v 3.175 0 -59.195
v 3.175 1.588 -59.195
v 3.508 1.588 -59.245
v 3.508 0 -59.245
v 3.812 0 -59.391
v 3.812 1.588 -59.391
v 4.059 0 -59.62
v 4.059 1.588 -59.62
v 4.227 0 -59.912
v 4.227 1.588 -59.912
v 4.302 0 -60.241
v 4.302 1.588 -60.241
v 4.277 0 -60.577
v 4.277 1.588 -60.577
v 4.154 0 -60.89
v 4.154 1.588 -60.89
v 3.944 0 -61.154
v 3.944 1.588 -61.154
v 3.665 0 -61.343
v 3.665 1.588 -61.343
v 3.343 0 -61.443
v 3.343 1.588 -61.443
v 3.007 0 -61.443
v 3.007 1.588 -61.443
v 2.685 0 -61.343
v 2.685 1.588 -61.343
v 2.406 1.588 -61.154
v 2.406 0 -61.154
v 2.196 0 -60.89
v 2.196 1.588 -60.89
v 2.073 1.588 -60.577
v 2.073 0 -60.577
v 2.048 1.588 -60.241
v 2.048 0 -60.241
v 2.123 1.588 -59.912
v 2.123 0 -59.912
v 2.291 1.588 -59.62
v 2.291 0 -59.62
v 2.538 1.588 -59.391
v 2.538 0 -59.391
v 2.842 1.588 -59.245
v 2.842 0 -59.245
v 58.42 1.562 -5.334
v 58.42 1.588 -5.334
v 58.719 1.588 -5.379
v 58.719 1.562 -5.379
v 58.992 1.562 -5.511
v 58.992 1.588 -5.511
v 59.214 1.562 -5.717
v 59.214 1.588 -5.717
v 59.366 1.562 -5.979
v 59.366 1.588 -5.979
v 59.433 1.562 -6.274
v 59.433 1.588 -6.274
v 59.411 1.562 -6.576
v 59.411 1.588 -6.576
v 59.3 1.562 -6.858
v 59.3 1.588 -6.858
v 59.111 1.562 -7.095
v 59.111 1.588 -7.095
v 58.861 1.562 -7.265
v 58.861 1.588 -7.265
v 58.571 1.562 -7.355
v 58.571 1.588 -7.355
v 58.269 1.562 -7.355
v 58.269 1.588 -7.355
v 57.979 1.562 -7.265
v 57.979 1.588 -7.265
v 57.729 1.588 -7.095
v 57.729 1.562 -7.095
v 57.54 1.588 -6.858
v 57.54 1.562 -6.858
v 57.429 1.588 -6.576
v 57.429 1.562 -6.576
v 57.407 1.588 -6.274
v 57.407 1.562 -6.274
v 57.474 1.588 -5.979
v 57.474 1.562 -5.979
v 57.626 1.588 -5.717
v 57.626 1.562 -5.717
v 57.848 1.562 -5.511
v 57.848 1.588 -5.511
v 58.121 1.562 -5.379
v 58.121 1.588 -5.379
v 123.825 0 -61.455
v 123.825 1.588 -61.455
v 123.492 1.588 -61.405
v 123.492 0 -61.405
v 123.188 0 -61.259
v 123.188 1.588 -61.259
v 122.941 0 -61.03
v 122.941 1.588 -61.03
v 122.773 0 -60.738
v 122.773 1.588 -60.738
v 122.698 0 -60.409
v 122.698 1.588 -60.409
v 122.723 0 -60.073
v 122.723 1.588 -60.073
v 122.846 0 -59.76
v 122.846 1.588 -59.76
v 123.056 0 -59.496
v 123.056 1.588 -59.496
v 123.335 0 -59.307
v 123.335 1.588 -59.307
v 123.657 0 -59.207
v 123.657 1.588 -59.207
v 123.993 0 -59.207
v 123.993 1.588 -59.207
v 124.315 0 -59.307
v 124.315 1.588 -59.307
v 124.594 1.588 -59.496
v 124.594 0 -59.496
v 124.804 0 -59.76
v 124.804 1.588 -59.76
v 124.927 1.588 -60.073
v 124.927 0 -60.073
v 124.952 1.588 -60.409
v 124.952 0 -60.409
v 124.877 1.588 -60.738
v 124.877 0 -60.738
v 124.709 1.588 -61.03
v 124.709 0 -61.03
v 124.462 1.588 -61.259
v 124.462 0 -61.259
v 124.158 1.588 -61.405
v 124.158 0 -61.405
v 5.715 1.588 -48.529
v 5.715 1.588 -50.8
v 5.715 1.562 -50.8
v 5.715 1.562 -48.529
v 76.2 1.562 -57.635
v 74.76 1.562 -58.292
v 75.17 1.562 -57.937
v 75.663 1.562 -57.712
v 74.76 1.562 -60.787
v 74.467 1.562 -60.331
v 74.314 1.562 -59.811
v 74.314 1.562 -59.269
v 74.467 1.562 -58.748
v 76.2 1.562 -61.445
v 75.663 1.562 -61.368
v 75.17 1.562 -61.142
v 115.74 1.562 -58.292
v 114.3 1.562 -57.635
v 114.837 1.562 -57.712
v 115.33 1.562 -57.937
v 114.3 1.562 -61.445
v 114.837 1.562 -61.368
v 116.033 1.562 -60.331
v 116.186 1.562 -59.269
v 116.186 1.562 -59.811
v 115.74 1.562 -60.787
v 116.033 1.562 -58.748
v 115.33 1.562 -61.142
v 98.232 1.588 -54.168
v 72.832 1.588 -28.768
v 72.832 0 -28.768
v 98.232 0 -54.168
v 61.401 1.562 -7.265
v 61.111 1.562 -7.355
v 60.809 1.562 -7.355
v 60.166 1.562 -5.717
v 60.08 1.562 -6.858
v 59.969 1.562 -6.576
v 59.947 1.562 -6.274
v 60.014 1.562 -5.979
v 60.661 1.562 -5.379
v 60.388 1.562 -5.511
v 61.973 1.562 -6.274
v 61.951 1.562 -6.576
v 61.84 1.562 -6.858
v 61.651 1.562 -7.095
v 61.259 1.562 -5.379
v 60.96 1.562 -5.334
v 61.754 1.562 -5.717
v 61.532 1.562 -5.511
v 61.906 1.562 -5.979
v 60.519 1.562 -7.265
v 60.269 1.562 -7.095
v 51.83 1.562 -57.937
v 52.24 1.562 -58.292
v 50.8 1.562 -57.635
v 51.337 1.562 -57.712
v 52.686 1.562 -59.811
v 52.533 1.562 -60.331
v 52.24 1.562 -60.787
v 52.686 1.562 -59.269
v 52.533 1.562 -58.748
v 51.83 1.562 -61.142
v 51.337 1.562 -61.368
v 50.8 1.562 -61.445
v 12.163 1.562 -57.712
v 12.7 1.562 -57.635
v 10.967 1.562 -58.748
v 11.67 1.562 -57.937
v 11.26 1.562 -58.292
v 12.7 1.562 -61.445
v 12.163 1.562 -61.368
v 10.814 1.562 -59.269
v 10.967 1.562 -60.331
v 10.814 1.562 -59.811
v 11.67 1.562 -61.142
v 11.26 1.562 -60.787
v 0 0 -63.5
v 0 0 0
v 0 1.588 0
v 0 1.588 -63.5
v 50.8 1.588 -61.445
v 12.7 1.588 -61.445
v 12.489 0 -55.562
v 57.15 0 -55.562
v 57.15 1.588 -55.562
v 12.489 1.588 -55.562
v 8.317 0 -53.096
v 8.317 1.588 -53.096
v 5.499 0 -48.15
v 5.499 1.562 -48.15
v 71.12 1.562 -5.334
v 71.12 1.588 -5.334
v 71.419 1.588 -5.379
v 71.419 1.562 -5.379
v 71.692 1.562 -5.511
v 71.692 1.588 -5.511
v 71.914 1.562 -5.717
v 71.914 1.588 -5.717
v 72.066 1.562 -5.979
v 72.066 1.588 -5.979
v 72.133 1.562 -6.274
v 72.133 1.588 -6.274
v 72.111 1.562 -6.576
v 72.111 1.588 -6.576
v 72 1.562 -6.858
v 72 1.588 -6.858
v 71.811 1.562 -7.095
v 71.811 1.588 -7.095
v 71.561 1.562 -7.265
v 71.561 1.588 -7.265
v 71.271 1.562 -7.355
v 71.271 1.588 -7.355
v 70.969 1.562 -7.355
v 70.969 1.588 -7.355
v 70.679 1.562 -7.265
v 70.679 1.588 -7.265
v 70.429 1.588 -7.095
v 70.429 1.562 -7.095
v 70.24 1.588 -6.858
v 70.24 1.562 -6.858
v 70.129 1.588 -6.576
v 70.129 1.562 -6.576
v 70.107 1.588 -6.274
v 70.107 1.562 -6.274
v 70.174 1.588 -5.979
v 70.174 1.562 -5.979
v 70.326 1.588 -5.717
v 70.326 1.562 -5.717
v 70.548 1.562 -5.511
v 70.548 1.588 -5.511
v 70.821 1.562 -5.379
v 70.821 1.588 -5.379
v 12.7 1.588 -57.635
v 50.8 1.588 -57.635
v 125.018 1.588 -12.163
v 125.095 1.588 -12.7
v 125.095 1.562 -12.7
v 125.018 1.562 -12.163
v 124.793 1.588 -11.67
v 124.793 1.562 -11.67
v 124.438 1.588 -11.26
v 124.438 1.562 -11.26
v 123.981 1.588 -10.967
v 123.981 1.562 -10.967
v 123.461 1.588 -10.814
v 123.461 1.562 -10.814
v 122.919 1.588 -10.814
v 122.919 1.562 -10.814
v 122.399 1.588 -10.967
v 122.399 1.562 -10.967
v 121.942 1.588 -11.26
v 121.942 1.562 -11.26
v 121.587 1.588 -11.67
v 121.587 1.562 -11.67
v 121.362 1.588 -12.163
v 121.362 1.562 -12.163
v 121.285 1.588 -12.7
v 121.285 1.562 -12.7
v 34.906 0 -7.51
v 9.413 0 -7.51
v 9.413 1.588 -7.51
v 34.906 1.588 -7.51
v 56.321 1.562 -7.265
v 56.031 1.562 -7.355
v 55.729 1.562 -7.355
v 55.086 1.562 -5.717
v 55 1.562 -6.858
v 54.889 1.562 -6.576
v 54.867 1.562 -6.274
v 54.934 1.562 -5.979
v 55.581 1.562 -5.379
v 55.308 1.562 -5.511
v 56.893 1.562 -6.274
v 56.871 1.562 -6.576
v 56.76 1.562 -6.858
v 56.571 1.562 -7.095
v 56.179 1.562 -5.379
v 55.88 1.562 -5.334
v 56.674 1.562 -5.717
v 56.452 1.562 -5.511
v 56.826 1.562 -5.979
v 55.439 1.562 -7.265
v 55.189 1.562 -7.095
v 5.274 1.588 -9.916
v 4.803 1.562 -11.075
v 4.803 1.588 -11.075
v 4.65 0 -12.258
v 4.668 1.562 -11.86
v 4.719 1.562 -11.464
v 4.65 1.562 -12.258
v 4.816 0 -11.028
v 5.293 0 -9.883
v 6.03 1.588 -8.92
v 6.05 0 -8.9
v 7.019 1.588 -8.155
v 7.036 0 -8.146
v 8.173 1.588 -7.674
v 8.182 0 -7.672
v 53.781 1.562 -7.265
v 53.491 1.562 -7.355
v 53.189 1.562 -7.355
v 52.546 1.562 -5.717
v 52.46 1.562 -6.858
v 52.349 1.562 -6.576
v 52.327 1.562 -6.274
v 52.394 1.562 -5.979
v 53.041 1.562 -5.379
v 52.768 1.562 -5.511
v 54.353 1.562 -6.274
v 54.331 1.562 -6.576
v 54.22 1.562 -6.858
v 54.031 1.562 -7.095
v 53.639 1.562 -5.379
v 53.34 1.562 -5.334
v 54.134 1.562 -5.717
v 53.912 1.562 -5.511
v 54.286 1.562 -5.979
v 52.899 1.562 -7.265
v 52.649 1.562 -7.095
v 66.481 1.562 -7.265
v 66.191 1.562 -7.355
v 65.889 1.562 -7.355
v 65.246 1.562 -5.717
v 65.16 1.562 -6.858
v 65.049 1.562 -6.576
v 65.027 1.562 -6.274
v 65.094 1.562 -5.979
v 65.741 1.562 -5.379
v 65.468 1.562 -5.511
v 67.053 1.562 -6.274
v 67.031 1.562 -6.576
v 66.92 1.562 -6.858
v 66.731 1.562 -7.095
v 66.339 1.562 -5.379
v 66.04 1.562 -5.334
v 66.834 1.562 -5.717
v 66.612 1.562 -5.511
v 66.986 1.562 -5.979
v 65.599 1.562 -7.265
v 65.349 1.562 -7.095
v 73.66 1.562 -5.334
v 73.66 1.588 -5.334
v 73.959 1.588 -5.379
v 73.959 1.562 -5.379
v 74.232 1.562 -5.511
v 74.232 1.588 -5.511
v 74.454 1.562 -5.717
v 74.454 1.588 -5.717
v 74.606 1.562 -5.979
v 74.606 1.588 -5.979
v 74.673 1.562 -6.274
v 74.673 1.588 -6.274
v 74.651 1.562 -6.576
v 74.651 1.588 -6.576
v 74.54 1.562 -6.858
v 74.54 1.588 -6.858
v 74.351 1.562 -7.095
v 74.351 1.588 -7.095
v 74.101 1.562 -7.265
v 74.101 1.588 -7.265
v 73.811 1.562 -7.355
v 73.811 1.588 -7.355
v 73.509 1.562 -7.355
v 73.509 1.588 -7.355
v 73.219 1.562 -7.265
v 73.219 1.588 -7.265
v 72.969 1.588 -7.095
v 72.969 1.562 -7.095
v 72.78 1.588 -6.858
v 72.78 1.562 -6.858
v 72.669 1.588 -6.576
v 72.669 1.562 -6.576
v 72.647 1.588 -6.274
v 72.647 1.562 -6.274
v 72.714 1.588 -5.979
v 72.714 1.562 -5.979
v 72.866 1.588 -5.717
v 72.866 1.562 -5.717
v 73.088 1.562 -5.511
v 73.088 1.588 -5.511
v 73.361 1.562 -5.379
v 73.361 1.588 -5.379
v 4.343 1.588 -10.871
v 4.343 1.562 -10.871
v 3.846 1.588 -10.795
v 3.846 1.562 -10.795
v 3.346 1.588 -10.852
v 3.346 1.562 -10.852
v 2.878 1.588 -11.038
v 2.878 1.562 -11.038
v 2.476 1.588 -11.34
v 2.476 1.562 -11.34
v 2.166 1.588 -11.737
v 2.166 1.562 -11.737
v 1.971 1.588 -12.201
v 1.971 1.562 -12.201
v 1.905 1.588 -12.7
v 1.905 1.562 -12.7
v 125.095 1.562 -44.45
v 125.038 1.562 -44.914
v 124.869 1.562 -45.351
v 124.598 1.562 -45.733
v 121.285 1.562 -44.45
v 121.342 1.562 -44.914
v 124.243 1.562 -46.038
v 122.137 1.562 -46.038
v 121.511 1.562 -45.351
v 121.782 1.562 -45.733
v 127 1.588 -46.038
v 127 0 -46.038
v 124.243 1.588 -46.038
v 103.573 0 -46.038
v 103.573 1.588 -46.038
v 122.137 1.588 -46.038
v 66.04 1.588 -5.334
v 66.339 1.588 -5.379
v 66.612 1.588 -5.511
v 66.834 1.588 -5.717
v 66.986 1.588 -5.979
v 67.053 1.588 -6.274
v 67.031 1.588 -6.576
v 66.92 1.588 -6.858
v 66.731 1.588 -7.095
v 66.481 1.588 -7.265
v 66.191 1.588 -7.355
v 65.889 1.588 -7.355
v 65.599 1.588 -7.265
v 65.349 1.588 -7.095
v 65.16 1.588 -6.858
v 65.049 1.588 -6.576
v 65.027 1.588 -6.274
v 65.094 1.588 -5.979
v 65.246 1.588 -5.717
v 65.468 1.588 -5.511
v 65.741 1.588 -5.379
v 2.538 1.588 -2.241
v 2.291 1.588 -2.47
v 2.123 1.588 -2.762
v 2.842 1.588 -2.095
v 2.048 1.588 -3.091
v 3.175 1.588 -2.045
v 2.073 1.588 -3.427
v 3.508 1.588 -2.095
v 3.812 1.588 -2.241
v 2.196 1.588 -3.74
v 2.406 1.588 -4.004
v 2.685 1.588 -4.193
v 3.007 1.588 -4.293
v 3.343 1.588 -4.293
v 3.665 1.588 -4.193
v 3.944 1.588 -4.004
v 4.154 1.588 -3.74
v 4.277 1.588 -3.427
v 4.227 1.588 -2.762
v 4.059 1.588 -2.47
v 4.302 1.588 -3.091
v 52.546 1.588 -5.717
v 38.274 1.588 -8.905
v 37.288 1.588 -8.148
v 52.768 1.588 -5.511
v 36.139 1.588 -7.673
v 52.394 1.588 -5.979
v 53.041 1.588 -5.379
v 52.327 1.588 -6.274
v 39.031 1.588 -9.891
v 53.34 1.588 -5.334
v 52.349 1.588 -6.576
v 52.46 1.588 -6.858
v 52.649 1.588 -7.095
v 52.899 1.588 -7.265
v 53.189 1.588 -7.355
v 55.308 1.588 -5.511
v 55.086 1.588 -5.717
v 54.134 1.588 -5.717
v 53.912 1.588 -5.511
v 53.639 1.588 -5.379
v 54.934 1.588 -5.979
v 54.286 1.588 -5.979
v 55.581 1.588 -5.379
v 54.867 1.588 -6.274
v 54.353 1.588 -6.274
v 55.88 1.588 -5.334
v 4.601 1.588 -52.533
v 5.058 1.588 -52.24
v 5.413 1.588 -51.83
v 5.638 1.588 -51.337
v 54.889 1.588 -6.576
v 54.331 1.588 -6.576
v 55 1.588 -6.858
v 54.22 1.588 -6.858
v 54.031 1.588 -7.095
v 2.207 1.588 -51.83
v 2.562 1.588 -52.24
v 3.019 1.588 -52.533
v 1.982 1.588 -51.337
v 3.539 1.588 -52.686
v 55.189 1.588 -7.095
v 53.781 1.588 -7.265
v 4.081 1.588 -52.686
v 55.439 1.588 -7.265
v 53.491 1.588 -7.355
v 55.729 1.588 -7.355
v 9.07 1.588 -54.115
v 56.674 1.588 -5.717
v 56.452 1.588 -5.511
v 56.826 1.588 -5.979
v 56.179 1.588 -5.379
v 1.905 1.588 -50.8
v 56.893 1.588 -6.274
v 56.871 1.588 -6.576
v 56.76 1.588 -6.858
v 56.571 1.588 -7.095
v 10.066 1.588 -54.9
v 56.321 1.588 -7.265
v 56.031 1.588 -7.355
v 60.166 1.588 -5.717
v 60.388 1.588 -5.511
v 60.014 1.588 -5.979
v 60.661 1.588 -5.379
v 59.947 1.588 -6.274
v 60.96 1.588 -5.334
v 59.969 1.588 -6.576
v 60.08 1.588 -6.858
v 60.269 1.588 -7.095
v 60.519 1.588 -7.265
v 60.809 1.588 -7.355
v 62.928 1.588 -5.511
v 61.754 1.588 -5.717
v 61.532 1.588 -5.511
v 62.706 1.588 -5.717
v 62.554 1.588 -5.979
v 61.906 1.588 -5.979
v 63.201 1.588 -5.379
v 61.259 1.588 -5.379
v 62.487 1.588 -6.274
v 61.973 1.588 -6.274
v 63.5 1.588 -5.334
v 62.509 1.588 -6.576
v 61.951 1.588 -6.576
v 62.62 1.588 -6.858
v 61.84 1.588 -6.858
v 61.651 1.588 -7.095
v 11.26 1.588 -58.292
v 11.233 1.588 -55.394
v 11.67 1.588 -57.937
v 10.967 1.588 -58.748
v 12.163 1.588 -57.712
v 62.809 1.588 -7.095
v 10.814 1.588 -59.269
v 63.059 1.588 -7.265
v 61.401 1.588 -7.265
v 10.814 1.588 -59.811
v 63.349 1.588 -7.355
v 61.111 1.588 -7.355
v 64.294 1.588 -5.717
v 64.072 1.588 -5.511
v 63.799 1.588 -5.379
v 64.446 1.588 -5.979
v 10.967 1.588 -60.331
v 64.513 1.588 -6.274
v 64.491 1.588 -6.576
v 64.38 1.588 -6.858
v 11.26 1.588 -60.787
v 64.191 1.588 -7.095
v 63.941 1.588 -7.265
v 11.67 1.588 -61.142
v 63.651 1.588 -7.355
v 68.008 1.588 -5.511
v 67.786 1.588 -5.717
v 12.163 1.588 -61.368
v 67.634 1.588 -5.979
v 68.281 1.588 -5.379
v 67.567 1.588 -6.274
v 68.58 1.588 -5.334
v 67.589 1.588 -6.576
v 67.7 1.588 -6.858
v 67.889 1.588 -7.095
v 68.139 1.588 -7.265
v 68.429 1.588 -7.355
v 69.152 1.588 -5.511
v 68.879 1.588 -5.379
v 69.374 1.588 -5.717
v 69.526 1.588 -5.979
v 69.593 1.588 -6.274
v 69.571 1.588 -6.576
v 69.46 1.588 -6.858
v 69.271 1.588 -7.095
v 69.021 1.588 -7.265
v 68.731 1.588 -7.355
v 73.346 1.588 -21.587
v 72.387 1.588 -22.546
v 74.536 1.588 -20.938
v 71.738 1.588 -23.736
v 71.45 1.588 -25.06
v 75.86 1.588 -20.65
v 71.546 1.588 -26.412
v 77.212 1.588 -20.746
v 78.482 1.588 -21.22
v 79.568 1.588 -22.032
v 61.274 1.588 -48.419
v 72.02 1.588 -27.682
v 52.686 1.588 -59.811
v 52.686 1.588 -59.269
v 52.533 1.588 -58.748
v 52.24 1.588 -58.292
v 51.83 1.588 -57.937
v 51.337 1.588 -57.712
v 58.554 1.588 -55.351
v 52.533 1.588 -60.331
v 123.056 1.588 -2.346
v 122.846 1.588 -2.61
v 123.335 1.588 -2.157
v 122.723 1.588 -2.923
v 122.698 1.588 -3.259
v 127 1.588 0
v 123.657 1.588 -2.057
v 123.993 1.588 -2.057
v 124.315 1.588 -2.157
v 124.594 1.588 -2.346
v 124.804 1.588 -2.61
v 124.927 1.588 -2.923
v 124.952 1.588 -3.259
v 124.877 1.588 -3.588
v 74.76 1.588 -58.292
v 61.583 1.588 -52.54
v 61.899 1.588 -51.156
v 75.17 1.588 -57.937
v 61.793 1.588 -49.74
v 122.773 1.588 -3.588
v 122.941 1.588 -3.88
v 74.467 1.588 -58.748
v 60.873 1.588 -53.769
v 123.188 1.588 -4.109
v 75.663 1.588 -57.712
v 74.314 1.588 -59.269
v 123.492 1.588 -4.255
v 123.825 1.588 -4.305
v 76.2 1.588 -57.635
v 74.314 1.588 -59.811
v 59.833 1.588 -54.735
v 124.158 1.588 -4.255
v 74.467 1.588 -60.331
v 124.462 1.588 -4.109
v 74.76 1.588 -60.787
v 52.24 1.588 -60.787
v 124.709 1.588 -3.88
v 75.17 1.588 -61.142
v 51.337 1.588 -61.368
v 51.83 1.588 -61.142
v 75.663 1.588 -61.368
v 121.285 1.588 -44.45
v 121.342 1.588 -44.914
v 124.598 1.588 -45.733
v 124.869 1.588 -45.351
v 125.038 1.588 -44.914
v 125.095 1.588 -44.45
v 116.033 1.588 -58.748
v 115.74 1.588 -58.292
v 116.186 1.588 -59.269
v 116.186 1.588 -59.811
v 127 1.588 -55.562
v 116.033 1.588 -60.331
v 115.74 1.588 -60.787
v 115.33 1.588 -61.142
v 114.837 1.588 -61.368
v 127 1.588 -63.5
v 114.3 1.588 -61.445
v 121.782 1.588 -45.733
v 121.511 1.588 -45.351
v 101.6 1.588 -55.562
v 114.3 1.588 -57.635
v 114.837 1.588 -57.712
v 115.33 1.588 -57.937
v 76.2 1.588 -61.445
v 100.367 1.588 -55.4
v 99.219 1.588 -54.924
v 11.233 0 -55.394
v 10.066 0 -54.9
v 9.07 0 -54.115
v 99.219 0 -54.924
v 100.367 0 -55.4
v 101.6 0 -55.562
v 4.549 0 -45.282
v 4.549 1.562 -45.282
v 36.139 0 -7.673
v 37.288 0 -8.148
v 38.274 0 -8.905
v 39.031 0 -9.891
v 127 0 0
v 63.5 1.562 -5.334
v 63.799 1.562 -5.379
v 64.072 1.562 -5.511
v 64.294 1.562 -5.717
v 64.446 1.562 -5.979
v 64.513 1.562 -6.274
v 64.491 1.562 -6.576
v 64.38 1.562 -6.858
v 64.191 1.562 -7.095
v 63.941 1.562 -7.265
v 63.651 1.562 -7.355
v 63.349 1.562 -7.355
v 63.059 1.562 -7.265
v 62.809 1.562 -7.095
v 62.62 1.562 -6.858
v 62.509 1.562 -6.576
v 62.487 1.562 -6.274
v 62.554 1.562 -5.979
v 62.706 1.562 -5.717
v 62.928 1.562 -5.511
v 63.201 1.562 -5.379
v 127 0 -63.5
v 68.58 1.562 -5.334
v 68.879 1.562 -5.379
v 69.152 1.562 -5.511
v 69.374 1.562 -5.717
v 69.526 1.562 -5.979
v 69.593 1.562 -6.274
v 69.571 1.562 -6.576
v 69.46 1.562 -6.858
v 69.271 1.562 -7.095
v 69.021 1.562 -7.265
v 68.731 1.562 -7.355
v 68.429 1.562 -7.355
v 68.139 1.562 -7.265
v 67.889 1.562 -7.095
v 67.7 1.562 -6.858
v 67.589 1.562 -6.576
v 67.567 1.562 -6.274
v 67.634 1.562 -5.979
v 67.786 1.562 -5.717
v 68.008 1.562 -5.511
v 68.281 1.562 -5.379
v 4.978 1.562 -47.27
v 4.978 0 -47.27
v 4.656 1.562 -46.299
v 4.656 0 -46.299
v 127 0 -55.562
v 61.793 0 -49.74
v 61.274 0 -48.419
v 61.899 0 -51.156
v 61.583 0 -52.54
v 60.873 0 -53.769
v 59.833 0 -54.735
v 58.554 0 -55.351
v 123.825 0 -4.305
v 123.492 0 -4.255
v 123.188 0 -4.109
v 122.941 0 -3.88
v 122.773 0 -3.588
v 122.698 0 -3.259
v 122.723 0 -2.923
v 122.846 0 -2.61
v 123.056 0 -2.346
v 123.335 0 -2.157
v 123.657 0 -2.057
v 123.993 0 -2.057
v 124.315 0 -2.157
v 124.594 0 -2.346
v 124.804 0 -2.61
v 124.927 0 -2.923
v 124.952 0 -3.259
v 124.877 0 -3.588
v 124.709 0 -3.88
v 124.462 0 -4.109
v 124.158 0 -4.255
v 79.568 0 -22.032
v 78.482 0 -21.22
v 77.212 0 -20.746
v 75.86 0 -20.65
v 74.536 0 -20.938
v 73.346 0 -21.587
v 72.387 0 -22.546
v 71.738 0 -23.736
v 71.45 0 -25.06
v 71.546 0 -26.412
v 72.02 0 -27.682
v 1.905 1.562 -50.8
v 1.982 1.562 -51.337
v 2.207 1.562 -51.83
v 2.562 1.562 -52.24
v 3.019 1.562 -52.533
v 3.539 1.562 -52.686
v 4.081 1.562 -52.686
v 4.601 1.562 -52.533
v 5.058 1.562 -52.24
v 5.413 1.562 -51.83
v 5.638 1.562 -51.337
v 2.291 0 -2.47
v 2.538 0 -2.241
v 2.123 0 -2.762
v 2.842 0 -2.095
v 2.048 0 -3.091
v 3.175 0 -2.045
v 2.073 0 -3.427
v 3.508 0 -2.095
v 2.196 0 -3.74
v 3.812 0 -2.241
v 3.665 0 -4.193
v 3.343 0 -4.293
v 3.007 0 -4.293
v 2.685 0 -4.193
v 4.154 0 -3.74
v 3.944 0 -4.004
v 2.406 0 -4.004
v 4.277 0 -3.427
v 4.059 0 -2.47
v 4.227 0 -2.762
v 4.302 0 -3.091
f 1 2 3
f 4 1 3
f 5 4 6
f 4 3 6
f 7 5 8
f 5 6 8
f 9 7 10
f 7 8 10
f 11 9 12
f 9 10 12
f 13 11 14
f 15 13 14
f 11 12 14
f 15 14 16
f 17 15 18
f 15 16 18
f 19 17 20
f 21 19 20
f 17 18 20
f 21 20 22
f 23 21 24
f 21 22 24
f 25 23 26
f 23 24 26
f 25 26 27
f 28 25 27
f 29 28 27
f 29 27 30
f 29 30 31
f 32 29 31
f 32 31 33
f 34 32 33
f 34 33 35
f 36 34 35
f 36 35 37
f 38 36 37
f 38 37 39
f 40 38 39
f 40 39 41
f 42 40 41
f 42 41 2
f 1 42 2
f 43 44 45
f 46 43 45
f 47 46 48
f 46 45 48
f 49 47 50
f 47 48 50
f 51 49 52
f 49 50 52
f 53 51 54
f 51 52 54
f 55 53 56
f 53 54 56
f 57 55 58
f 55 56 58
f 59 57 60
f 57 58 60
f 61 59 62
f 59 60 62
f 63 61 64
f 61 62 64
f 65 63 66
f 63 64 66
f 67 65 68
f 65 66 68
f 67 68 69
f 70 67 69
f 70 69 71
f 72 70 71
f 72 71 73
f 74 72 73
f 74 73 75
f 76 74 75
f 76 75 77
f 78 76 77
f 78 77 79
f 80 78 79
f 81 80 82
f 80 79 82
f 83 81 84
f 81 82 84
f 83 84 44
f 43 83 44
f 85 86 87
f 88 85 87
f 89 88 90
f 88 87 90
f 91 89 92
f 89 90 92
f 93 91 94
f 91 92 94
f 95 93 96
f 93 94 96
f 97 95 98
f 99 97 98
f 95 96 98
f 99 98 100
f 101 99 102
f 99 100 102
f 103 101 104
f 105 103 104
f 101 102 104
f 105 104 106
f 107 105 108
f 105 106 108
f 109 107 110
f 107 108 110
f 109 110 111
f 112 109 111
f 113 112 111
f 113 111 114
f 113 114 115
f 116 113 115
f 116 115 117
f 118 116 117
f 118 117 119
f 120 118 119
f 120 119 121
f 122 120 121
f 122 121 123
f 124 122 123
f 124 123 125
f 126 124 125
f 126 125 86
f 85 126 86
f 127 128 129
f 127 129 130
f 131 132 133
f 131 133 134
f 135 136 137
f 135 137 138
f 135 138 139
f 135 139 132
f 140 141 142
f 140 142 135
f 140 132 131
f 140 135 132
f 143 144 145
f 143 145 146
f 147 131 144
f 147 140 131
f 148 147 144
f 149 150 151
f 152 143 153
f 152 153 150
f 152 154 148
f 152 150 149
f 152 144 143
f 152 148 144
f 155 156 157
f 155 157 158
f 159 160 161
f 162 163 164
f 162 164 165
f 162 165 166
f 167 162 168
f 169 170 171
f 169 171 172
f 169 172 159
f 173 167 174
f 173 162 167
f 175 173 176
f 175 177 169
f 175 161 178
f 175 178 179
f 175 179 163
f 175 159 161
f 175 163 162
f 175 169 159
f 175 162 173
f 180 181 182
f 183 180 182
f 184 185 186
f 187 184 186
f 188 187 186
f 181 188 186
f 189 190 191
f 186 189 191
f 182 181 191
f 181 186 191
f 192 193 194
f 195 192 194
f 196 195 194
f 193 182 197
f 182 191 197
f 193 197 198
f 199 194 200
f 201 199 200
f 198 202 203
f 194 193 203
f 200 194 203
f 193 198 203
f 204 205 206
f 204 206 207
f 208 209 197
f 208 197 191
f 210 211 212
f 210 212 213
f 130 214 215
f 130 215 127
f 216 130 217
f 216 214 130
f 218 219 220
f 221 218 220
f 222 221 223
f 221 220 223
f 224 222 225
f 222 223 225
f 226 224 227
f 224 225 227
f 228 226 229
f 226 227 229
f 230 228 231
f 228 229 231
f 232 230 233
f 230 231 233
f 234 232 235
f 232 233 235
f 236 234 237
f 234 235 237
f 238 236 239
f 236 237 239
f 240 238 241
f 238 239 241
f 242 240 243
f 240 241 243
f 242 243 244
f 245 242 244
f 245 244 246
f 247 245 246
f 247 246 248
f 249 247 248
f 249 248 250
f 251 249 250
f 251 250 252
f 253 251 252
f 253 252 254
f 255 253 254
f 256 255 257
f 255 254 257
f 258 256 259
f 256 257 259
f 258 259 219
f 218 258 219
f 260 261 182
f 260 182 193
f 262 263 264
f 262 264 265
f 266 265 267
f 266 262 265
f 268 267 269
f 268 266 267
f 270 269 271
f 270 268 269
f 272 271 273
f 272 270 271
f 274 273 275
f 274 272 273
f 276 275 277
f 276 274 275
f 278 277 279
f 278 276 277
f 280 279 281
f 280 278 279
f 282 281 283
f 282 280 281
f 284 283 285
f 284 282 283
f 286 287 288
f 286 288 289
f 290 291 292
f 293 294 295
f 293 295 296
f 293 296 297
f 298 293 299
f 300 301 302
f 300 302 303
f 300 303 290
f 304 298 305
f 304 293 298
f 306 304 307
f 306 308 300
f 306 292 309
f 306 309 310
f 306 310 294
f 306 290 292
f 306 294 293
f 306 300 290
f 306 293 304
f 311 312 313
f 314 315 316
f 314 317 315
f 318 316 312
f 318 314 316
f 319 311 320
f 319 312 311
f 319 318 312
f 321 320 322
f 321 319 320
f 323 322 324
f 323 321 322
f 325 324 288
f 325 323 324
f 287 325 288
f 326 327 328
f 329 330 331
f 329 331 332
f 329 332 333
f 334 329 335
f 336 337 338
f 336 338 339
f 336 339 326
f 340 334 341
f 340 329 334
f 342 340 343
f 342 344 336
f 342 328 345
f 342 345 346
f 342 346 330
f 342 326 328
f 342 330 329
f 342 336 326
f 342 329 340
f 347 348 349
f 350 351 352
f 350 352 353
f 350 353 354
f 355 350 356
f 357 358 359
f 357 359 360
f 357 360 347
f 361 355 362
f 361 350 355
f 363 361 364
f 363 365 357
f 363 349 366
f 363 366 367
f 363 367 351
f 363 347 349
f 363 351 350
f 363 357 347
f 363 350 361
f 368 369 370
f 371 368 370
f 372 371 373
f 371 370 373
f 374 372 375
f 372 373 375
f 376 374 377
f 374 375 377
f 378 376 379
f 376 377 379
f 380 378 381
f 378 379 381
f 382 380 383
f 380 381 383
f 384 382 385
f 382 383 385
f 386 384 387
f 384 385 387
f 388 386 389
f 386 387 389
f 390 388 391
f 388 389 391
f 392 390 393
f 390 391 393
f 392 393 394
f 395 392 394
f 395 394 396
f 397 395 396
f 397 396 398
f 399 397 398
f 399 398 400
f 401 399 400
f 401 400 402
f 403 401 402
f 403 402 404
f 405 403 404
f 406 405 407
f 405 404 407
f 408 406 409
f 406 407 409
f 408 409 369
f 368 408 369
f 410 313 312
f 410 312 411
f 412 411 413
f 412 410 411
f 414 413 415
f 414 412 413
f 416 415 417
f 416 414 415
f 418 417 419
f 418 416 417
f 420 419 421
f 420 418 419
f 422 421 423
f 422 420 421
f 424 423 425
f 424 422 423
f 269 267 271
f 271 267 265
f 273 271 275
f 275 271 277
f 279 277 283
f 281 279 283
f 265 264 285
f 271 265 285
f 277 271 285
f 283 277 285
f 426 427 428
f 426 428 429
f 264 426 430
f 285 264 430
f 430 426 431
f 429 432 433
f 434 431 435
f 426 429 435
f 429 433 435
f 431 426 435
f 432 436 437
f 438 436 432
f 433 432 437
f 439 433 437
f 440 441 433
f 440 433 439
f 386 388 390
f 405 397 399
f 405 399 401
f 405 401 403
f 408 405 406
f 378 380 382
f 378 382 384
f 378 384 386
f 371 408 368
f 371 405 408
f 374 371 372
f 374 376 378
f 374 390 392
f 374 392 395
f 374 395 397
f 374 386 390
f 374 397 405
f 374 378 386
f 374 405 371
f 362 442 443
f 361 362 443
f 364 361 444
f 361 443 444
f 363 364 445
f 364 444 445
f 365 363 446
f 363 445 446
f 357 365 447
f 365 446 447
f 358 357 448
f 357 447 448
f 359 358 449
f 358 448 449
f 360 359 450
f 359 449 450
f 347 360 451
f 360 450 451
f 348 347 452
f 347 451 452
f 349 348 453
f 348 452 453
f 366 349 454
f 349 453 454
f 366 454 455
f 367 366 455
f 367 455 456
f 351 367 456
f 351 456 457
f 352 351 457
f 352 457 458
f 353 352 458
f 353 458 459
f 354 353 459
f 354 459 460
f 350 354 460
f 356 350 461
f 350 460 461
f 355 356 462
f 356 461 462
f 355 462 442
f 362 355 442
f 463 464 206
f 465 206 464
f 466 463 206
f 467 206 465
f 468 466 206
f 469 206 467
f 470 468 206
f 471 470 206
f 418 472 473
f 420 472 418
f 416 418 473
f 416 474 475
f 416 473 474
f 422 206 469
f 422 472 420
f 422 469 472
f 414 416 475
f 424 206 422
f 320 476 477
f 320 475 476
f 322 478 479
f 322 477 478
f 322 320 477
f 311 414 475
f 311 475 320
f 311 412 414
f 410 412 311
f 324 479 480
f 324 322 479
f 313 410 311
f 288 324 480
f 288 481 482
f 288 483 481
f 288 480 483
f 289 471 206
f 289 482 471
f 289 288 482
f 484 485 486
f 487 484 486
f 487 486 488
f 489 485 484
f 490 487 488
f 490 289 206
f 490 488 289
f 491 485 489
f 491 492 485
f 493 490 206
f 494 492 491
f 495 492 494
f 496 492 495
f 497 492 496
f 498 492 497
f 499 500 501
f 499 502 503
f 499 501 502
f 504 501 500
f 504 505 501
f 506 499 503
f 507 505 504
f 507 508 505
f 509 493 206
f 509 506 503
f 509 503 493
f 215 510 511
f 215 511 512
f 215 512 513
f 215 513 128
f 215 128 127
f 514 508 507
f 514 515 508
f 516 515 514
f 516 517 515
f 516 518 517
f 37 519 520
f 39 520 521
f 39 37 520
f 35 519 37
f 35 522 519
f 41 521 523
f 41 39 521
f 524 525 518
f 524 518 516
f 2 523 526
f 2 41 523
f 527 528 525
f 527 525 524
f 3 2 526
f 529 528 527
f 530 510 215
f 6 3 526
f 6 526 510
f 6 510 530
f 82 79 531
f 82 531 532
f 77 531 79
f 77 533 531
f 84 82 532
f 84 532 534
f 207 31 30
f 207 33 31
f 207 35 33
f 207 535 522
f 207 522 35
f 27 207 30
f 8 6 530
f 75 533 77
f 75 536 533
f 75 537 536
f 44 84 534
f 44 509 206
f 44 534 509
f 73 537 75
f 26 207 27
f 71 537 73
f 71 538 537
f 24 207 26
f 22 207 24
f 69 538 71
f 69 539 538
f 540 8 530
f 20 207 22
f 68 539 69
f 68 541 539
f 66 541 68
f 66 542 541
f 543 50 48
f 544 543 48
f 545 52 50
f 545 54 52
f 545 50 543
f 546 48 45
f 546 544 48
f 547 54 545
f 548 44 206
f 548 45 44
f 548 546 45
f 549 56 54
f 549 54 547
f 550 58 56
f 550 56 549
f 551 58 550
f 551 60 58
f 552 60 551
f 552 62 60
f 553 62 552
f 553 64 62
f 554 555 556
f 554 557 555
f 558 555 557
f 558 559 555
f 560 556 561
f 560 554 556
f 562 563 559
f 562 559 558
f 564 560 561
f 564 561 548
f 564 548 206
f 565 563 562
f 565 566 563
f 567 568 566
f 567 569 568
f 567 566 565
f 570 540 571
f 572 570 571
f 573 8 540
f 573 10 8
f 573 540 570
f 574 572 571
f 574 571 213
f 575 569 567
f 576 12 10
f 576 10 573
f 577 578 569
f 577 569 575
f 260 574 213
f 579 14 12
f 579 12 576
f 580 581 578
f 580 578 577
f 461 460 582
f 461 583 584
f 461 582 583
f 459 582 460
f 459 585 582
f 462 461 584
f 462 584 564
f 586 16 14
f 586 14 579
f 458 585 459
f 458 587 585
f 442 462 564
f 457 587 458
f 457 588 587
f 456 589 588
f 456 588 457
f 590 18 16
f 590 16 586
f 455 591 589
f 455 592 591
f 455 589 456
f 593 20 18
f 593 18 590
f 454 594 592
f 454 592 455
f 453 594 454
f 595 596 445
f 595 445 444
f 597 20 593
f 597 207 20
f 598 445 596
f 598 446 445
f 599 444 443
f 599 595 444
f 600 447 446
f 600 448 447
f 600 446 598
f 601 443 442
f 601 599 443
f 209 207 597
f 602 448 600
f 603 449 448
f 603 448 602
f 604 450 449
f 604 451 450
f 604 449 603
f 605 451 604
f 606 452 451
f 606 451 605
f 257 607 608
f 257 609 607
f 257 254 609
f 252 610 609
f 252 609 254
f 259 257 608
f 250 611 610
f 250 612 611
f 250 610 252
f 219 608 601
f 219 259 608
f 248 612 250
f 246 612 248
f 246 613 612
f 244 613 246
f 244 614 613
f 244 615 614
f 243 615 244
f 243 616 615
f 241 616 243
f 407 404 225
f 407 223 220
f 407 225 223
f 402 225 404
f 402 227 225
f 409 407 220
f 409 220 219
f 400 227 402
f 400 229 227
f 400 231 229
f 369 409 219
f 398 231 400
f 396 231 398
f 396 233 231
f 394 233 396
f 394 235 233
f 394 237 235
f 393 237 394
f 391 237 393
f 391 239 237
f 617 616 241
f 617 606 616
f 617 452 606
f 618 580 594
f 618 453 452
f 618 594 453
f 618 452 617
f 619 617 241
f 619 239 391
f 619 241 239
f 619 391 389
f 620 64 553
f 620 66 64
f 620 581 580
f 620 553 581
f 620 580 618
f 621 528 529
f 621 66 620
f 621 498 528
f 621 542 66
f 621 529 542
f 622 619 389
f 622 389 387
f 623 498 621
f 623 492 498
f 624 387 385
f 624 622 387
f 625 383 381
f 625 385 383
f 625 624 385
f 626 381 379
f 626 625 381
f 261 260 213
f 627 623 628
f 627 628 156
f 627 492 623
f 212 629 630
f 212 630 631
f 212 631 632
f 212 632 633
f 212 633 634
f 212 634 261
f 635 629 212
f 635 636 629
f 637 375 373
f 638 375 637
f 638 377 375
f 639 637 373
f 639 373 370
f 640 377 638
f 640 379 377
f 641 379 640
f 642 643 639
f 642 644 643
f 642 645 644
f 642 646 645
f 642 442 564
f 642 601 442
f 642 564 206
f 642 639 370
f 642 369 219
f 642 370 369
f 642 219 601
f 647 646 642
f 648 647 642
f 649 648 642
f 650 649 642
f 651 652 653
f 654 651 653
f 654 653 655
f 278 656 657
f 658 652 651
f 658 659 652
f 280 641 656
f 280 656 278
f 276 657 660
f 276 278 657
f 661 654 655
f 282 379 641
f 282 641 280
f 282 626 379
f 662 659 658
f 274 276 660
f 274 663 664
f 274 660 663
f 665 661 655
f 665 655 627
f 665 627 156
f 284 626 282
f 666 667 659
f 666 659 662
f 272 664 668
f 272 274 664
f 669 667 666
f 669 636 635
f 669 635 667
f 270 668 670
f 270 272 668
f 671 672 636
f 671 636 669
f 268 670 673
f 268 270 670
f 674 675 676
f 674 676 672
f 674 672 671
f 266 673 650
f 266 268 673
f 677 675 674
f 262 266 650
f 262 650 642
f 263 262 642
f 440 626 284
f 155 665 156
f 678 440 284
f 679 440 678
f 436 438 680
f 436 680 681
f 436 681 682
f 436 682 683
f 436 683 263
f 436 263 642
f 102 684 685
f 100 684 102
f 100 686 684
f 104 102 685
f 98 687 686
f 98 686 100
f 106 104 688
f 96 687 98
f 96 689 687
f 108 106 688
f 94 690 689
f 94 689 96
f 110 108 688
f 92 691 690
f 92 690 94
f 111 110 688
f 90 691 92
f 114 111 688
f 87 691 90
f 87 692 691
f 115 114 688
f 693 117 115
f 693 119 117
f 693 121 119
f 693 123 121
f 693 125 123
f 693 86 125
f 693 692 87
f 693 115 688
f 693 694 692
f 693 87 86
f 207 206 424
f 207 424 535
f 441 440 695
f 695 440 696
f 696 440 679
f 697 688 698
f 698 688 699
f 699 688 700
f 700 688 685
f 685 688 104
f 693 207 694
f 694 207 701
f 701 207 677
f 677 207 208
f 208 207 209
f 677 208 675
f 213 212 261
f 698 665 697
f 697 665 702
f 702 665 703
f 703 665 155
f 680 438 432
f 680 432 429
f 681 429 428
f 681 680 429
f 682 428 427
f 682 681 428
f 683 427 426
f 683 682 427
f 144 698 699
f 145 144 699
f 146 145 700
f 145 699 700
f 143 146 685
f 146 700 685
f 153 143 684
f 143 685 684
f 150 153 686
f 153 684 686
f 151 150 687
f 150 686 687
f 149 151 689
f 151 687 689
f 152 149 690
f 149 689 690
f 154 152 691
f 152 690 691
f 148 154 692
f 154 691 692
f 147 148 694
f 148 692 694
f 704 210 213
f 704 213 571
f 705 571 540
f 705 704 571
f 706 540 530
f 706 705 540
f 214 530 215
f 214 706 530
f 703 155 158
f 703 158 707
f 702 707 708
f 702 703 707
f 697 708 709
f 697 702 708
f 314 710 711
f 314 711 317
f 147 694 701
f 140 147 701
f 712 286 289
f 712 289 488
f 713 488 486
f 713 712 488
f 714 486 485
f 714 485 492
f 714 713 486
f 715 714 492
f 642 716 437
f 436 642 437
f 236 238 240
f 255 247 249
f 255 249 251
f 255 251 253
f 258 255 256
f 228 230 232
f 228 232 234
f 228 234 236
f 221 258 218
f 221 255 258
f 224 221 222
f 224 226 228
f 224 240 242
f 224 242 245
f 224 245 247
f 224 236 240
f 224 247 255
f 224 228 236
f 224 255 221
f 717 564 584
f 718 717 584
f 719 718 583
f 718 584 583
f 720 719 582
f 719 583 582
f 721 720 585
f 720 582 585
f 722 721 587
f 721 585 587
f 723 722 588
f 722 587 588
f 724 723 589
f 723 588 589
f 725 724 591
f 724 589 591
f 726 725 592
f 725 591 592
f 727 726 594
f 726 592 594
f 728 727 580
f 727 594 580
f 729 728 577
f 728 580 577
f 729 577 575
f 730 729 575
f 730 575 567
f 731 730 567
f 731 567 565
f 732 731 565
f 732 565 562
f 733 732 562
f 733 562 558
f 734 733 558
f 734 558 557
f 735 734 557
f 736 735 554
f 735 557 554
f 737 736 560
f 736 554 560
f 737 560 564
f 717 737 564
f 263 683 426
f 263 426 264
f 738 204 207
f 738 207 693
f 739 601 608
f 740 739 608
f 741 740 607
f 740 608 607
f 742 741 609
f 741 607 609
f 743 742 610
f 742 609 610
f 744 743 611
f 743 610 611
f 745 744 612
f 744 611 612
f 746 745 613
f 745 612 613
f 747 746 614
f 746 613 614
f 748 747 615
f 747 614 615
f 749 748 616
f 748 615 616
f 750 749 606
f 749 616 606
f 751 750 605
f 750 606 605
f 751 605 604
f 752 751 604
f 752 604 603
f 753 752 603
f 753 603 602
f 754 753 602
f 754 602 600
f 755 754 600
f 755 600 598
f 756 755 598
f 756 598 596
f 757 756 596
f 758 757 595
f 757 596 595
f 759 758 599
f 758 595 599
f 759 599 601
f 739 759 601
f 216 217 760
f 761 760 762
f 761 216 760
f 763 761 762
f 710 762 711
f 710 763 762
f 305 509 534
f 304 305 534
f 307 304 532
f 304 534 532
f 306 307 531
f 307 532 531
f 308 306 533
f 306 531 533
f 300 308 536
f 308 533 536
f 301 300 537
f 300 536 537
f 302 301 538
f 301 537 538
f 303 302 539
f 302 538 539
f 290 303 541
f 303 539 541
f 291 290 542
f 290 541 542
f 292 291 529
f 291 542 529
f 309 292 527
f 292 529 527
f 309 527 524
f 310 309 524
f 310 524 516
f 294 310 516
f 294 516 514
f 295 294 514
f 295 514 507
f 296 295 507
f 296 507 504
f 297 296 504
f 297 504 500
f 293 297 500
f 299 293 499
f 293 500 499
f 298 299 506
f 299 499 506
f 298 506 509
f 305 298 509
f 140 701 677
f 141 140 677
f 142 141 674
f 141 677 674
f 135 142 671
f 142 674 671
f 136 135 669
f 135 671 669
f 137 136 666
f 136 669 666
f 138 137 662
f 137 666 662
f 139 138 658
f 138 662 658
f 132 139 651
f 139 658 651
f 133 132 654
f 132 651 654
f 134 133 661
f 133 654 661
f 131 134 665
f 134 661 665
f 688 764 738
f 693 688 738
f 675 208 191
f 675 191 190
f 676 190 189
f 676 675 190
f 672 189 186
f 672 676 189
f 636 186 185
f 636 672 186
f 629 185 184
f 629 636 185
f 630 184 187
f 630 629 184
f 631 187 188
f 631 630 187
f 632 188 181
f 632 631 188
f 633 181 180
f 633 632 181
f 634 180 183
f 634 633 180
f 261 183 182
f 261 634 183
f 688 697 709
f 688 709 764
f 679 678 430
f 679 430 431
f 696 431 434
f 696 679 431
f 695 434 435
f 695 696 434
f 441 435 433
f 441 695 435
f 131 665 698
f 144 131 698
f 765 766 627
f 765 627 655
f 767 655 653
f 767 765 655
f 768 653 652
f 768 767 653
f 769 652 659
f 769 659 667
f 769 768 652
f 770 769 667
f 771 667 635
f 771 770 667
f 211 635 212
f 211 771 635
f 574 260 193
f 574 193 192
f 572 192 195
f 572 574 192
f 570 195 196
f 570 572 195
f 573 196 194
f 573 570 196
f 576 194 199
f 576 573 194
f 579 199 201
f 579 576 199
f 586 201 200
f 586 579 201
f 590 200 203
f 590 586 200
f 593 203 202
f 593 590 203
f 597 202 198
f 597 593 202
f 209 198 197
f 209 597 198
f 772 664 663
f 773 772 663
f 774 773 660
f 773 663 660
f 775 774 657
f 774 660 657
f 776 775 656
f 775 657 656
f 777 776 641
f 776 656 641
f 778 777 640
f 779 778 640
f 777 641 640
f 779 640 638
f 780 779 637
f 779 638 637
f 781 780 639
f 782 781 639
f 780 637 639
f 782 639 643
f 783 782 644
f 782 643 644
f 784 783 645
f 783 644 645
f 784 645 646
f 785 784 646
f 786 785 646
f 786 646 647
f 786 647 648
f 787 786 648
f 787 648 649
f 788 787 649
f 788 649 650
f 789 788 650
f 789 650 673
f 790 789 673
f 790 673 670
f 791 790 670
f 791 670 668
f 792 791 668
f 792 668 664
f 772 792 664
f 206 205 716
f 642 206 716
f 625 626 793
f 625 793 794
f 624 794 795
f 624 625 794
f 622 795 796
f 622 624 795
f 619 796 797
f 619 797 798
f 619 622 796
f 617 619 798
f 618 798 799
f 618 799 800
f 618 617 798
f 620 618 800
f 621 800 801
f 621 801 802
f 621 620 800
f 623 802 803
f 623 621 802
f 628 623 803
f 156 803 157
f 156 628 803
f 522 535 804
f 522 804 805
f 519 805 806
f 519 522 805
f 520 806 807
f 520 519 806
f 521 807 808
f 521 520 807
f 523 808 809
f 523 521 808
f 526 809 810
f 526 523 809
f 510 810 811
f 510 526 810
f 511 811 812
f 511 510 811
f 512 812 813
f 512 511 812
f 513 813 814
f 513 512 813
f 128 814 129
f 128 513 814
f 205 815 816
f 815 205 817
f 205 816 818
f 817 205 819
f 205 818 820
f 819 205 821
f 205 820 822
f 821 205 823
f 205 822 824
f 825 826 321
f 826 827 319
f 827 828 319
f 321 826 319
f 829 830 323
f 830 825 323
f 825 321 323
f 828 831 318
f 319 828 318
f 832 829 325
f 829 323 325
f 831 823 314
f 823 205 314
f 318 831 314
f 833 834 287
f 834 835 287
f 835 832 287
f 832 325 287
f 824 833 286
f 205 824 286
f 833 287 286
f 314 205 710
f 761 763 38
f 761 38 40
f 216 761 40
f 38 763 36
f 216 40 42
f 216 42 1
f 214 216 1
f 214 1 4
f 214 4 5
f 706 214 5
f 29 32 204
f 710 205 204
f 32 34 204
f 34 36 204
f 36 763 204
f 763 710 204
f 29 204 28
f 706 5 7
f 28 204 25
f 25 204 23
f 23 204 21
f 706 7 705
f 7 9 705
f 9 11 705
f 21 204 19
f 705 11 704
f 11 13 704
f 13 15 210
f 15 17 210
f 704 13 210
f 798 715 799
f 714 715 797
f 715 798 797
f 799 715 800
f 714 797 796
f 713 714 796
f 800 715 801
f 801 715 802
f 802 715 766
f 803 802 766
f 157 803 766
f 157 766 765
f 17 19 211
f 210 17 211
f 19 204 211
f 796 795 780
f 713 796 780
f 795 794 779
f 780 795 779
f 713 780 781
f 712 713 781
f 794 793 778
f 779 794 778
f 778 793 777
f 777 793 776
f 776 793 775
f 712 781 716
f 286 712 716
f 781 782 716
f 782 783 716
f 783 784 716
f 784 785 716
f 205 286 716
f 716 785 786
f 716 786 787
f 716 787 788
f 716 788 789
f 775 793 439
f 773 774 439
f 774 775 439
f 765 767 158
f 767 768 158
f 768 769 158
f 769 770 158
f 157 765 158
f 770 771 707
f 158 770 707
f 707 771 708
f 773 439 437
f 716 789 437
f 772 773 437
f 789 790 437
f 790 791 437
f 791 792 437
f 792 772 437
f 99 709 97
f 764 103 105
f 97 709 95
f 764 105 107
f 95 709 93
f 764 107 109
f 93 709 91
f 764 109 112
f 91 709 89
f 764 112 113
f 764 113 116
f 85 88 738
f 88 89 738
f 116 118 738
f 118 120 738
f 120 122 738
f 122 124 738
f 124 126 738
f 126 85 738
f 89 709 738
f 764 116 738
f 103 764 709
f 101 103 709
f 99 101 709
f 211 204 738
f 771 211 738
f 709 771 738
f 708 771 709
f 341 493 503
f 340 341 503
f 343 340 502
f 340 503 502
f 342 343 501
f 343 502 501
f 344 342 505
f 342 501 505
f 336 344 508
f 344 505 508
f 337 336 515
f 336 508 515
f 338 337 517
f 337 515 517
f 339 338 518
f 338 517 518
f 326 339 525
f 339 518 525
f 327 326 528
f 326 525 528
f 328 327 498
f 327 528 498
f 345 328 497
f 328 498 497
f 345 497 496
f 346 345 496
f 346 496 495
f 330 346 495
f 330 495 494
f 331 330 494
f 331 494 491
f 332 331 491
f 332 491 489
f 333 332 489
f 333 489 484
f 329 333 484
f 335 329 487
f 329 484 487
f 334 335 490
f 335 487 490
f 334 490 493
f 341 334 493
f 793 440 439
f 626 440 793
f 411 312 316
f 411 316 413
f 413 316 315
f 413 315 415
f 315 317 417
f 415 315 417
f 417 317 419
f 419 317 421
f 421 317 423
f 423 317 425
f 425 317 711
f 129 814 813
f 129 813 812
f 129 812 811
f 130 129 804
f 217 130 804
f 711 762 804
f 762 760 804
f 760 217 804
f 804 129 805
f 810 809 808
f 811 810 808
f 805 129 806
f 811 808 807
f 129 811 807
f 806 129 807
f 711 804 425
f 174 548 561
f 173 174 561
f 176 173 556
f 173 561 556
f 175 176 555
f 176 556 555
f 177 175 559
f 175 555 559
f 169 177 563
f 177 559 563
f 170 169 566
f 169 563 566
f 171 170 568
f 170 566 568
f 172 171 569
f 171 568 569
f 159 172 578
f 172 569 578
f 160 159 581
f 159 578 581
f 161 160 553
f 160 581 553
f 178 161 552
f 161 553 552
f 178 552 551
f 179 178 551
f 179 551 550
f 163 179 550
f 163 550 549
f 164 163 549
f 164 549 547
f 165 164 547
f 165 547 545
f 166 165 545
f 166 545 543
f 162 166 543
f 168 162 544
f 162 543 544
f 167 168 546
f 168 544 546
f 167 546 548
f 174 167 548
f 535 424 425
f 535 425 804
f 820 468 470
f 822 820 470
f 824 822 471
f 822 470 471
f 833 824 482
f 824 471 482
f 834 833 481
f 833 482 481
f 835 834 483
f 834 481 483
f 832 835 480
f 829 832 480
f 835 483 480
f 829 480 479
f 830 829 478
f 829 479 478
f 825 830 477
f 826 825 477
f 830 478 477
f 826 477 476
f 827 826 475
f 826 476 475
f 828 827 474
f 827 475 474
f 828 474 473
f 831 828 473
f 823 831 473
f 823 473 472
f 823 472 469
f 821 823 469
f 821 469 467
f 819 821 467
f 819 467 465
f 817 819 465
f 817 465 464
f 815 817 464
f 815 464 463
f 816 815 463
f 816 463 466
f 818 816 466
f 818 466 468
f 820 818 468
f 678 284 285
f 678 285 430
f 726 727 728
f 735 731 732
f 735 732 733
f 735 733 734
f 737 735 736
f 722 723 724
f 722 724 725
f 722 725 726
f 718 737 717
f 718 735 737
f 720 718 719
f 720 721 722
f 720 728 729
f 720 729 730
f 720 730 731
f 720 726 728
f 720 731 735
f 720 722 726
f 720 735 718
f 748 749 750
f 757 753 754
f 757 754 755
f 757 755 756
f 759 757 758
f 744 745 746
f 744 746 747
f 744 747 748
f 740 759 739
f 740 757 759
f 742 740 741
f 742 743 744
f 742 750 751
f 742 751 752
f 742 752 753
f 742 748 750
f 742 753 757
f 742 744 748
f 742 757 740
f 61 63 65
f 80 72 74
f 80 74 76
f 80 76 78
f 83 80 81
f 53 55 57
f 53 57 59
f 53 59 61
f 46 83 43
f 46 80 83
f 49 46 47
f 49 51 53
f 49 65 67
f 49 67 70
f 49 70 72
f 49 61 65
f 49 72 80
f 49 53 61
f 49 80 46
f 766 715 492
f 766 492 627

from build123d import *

# Parameters (mm, degrees)
SKETCH1_W           = 127
SKETCH1_H           = 63.5
BOSS_EXTRUDE1_DEPTH = 1.5875
SKETCH2_R           = 1.1303
CUT_EXTRUDE1_DEPTH  = 142.999190689
CUT_EXTRUDE2_DEPTH  = 1.5875
CUT_EXTRUDE3_DEPTH  = 1.5875
SKETCH3_R           = 1.016
CUT_EXTRUDE4_DEPTH  = 0.0254


with BuildPart() as part:
    # Sketch1 → Boss-Extrude1 (new body)
    with BuildSketch(Plane(origin=(0, 0, 0), x_dir=(1, 0, 0), z_dir=(0, 1, 0))):
        with Locations((63.5, 31.75)):
            Rectangle(SKETCH1_W, SKETCH1_H)
    extrude(amount=BOSS_EXTRUDE1_DEPTH)

    # Sketch2 → Cut-Extrude1 (cut, through all)
    with BuildSketch(Plane(origin=(0, 1.5875, 0), x_dir=(1, 0, 0), z_dir=(0, 1, 0))):
        with Locations((3.175, 60.325)):
            Circle(SKETCH2_R)
        with Locations((3.175, 3.175)):
            Circle(SKETCH2_R)
        with Locations((123.825, 3.175)):
            Circle(SKETCH2_R)
        with Locations((123.825, 60.325)):
            Circle(SKETCH2_R)
    extrude(amount=-CUT_EXTRUDE1_DEPTH, mode=Mode.SUBTRACT)

    # Sketch4 → Cut-Extrude2 (cut)
    with BuildSketch(Plane(origin=(0, 1.5875, 0), x_dir=(1, 0, 0), z_dir=(0, 1, 0))):
        with BuildLine():
            Line((98.232403955, 54.167596045), (72.832403955, 28.767596045))
            ThreePointArc((72.832403955, 28.767596045), (72.832403955, 22.032403955), (79.567596045, 22.032403955))
            Line((79.567596045, 22.032403955), (103.572692091, 46.0375))
            Line((103.572692091, 46.0375), (127, 46.0375))
            Line((127, 46.0375), (127, 55.5625))
            Line((127, 55.5625), (101.6, 55.5625))
            ThreePointArc((101.6, 55.5625), (99.777470153, 55.199976274), (98.232403955, 54.167596045))
        make_face()
    extrude(amount=-CUT_EXTRUDE2_DEPTH, mode=Mode.SUBTRACT)

    # Sketch5 → Cut-Extrude3 (cut)
    with BuildSketch(Plane(origin=(0, 1.5875, 0), x_dir=(-1, 0, 0), z_dir=(0, 1, 0))):
        with BuildLine():
            ThreePointArc((-4.650233894, -12.25819272), (-6.050264926, -8.900008545), (-9.412711658, -7.510246043))
            Line((-9.412711658, -7.510246043), (-34.906279557, -7.510246043))
            ThreePointArc((-34.906279557, -7.510246043), (-37.287529557, -8.148300057), (-39.030725542, -9.891496043))
            Line((-39.030725542, -9.891496043), (-61.274445986, -48.41875))
            ThreePointArc((-61.274445986, -48.41875), (-61.274445986, -53.18125), (-57.15, -55.5625))
            Line((-57.15, -55.5625), (-12.489472227, -55.5625))
            ThreePointArc((-12.489472227, -55.5625), (-10.065969168, -54.899760868), (-8.316964929, -53.095994141))
            Line((-8.316964929, -53.095994141), (-5.499068963, -48.1499644))
            ThreePointArc((-5.499068963, -48.1499644), (-4.790682084, -46.79307626), (-4.549320114, -45.281553255))
            Line((-4.549320114, -45.281553255), (-4.650233894, -12.25819272))
        make_face()
    extrude(amount=-CUT_EXTRUDE3_DEPTH, mode=Mode.SUBTRACT)

    # Sketch3 → Cut-Extrude4 (cut)
    with BuildSketch(Plane(origin=(0, 1.5875, 0), x_dir=(1, 0, 0), z_dir=(0, 1, 0))):
        with Locations((63.5, 6.35)):
            Circle(SKETCH3_R)
        with Locations((66.04, 6.35)):
            Circle(SKETCH3_R)
        with Locations((68.58, 6.35)):
            Circle(SKETCH3_R)
        with Locations((71.12, 6.35)):
            Circle(SKETCH3_R)
        with Locations((73.66, 6.35)):
            Circle(SKETCH3_R)
        with Locations((60.96, 6.35)):
            Circle(SKETCH3_R)
        with Locations((58.42, 6.35)):
            Circle(SKETCH3_R)
        with Locations((55.88, 6.35)):
            Circle(SKETCH3_R)
        with Locations((53.34, 6.35)):
            Circle(SKETCH3_R)
        with BuildLine():
            Line((5.715, 50.8), (5.715, 12.7))
            ThreePointArc((5.715, 12.7), (3.81, 10.795), (1.905, 12.7))
            Line((1.905, 12.7), (1.905, 50.8))
            ThreePointArc((1.905, 50.8), (3.81, 52.705), (5.715, 50.8))
        make_face()
        with BuildLine():
            Line((50.8, 57.634853503), (12.7, 57.634853503))
            ThreePointArc((12.7, 57.634853503), (10.795, 59.539853503), (12.7, 61.444853503))
            Line((12.7, 61.444853503), (50.8, 61.444853503))
            ThreePointArc((50.8, 61.444853503), (52.705, 59.539853503), (50.8, 57.634853503))
        make_face()
        with BuildLine():
            Line((76.2, 57.634853503), (114.3, 57.634853503))
            ThreePointArc((114.3, 57.634853503), (116.205, 59.539853503), (114.3, 61.444853503))
            Line((114.3, 61.444853503), (76.2, 61.444853503))
            ThreePointArc((76.2, 61.444853503), (74.295, 59.539853503), (76.2, 57.634853503))
        make_face()
        with BuildLine():
            Line((125.095, 44.45), (125.095, 12.7))
            ThreePointArc((125.095, 12.7), (123.19, 10.795), (121.285, 12.7))
            Line((121.285, 12.7), (121.285, 44.45))
            ThreePointArc((121.285, 44.45), (123.19, 46.355), (125.095, 44.45))
        make_face()
    extrude(amount=-CUT_EXTRUDE4_DEPTH, mode=Mode.SUBTRACT)


solid = part.part
